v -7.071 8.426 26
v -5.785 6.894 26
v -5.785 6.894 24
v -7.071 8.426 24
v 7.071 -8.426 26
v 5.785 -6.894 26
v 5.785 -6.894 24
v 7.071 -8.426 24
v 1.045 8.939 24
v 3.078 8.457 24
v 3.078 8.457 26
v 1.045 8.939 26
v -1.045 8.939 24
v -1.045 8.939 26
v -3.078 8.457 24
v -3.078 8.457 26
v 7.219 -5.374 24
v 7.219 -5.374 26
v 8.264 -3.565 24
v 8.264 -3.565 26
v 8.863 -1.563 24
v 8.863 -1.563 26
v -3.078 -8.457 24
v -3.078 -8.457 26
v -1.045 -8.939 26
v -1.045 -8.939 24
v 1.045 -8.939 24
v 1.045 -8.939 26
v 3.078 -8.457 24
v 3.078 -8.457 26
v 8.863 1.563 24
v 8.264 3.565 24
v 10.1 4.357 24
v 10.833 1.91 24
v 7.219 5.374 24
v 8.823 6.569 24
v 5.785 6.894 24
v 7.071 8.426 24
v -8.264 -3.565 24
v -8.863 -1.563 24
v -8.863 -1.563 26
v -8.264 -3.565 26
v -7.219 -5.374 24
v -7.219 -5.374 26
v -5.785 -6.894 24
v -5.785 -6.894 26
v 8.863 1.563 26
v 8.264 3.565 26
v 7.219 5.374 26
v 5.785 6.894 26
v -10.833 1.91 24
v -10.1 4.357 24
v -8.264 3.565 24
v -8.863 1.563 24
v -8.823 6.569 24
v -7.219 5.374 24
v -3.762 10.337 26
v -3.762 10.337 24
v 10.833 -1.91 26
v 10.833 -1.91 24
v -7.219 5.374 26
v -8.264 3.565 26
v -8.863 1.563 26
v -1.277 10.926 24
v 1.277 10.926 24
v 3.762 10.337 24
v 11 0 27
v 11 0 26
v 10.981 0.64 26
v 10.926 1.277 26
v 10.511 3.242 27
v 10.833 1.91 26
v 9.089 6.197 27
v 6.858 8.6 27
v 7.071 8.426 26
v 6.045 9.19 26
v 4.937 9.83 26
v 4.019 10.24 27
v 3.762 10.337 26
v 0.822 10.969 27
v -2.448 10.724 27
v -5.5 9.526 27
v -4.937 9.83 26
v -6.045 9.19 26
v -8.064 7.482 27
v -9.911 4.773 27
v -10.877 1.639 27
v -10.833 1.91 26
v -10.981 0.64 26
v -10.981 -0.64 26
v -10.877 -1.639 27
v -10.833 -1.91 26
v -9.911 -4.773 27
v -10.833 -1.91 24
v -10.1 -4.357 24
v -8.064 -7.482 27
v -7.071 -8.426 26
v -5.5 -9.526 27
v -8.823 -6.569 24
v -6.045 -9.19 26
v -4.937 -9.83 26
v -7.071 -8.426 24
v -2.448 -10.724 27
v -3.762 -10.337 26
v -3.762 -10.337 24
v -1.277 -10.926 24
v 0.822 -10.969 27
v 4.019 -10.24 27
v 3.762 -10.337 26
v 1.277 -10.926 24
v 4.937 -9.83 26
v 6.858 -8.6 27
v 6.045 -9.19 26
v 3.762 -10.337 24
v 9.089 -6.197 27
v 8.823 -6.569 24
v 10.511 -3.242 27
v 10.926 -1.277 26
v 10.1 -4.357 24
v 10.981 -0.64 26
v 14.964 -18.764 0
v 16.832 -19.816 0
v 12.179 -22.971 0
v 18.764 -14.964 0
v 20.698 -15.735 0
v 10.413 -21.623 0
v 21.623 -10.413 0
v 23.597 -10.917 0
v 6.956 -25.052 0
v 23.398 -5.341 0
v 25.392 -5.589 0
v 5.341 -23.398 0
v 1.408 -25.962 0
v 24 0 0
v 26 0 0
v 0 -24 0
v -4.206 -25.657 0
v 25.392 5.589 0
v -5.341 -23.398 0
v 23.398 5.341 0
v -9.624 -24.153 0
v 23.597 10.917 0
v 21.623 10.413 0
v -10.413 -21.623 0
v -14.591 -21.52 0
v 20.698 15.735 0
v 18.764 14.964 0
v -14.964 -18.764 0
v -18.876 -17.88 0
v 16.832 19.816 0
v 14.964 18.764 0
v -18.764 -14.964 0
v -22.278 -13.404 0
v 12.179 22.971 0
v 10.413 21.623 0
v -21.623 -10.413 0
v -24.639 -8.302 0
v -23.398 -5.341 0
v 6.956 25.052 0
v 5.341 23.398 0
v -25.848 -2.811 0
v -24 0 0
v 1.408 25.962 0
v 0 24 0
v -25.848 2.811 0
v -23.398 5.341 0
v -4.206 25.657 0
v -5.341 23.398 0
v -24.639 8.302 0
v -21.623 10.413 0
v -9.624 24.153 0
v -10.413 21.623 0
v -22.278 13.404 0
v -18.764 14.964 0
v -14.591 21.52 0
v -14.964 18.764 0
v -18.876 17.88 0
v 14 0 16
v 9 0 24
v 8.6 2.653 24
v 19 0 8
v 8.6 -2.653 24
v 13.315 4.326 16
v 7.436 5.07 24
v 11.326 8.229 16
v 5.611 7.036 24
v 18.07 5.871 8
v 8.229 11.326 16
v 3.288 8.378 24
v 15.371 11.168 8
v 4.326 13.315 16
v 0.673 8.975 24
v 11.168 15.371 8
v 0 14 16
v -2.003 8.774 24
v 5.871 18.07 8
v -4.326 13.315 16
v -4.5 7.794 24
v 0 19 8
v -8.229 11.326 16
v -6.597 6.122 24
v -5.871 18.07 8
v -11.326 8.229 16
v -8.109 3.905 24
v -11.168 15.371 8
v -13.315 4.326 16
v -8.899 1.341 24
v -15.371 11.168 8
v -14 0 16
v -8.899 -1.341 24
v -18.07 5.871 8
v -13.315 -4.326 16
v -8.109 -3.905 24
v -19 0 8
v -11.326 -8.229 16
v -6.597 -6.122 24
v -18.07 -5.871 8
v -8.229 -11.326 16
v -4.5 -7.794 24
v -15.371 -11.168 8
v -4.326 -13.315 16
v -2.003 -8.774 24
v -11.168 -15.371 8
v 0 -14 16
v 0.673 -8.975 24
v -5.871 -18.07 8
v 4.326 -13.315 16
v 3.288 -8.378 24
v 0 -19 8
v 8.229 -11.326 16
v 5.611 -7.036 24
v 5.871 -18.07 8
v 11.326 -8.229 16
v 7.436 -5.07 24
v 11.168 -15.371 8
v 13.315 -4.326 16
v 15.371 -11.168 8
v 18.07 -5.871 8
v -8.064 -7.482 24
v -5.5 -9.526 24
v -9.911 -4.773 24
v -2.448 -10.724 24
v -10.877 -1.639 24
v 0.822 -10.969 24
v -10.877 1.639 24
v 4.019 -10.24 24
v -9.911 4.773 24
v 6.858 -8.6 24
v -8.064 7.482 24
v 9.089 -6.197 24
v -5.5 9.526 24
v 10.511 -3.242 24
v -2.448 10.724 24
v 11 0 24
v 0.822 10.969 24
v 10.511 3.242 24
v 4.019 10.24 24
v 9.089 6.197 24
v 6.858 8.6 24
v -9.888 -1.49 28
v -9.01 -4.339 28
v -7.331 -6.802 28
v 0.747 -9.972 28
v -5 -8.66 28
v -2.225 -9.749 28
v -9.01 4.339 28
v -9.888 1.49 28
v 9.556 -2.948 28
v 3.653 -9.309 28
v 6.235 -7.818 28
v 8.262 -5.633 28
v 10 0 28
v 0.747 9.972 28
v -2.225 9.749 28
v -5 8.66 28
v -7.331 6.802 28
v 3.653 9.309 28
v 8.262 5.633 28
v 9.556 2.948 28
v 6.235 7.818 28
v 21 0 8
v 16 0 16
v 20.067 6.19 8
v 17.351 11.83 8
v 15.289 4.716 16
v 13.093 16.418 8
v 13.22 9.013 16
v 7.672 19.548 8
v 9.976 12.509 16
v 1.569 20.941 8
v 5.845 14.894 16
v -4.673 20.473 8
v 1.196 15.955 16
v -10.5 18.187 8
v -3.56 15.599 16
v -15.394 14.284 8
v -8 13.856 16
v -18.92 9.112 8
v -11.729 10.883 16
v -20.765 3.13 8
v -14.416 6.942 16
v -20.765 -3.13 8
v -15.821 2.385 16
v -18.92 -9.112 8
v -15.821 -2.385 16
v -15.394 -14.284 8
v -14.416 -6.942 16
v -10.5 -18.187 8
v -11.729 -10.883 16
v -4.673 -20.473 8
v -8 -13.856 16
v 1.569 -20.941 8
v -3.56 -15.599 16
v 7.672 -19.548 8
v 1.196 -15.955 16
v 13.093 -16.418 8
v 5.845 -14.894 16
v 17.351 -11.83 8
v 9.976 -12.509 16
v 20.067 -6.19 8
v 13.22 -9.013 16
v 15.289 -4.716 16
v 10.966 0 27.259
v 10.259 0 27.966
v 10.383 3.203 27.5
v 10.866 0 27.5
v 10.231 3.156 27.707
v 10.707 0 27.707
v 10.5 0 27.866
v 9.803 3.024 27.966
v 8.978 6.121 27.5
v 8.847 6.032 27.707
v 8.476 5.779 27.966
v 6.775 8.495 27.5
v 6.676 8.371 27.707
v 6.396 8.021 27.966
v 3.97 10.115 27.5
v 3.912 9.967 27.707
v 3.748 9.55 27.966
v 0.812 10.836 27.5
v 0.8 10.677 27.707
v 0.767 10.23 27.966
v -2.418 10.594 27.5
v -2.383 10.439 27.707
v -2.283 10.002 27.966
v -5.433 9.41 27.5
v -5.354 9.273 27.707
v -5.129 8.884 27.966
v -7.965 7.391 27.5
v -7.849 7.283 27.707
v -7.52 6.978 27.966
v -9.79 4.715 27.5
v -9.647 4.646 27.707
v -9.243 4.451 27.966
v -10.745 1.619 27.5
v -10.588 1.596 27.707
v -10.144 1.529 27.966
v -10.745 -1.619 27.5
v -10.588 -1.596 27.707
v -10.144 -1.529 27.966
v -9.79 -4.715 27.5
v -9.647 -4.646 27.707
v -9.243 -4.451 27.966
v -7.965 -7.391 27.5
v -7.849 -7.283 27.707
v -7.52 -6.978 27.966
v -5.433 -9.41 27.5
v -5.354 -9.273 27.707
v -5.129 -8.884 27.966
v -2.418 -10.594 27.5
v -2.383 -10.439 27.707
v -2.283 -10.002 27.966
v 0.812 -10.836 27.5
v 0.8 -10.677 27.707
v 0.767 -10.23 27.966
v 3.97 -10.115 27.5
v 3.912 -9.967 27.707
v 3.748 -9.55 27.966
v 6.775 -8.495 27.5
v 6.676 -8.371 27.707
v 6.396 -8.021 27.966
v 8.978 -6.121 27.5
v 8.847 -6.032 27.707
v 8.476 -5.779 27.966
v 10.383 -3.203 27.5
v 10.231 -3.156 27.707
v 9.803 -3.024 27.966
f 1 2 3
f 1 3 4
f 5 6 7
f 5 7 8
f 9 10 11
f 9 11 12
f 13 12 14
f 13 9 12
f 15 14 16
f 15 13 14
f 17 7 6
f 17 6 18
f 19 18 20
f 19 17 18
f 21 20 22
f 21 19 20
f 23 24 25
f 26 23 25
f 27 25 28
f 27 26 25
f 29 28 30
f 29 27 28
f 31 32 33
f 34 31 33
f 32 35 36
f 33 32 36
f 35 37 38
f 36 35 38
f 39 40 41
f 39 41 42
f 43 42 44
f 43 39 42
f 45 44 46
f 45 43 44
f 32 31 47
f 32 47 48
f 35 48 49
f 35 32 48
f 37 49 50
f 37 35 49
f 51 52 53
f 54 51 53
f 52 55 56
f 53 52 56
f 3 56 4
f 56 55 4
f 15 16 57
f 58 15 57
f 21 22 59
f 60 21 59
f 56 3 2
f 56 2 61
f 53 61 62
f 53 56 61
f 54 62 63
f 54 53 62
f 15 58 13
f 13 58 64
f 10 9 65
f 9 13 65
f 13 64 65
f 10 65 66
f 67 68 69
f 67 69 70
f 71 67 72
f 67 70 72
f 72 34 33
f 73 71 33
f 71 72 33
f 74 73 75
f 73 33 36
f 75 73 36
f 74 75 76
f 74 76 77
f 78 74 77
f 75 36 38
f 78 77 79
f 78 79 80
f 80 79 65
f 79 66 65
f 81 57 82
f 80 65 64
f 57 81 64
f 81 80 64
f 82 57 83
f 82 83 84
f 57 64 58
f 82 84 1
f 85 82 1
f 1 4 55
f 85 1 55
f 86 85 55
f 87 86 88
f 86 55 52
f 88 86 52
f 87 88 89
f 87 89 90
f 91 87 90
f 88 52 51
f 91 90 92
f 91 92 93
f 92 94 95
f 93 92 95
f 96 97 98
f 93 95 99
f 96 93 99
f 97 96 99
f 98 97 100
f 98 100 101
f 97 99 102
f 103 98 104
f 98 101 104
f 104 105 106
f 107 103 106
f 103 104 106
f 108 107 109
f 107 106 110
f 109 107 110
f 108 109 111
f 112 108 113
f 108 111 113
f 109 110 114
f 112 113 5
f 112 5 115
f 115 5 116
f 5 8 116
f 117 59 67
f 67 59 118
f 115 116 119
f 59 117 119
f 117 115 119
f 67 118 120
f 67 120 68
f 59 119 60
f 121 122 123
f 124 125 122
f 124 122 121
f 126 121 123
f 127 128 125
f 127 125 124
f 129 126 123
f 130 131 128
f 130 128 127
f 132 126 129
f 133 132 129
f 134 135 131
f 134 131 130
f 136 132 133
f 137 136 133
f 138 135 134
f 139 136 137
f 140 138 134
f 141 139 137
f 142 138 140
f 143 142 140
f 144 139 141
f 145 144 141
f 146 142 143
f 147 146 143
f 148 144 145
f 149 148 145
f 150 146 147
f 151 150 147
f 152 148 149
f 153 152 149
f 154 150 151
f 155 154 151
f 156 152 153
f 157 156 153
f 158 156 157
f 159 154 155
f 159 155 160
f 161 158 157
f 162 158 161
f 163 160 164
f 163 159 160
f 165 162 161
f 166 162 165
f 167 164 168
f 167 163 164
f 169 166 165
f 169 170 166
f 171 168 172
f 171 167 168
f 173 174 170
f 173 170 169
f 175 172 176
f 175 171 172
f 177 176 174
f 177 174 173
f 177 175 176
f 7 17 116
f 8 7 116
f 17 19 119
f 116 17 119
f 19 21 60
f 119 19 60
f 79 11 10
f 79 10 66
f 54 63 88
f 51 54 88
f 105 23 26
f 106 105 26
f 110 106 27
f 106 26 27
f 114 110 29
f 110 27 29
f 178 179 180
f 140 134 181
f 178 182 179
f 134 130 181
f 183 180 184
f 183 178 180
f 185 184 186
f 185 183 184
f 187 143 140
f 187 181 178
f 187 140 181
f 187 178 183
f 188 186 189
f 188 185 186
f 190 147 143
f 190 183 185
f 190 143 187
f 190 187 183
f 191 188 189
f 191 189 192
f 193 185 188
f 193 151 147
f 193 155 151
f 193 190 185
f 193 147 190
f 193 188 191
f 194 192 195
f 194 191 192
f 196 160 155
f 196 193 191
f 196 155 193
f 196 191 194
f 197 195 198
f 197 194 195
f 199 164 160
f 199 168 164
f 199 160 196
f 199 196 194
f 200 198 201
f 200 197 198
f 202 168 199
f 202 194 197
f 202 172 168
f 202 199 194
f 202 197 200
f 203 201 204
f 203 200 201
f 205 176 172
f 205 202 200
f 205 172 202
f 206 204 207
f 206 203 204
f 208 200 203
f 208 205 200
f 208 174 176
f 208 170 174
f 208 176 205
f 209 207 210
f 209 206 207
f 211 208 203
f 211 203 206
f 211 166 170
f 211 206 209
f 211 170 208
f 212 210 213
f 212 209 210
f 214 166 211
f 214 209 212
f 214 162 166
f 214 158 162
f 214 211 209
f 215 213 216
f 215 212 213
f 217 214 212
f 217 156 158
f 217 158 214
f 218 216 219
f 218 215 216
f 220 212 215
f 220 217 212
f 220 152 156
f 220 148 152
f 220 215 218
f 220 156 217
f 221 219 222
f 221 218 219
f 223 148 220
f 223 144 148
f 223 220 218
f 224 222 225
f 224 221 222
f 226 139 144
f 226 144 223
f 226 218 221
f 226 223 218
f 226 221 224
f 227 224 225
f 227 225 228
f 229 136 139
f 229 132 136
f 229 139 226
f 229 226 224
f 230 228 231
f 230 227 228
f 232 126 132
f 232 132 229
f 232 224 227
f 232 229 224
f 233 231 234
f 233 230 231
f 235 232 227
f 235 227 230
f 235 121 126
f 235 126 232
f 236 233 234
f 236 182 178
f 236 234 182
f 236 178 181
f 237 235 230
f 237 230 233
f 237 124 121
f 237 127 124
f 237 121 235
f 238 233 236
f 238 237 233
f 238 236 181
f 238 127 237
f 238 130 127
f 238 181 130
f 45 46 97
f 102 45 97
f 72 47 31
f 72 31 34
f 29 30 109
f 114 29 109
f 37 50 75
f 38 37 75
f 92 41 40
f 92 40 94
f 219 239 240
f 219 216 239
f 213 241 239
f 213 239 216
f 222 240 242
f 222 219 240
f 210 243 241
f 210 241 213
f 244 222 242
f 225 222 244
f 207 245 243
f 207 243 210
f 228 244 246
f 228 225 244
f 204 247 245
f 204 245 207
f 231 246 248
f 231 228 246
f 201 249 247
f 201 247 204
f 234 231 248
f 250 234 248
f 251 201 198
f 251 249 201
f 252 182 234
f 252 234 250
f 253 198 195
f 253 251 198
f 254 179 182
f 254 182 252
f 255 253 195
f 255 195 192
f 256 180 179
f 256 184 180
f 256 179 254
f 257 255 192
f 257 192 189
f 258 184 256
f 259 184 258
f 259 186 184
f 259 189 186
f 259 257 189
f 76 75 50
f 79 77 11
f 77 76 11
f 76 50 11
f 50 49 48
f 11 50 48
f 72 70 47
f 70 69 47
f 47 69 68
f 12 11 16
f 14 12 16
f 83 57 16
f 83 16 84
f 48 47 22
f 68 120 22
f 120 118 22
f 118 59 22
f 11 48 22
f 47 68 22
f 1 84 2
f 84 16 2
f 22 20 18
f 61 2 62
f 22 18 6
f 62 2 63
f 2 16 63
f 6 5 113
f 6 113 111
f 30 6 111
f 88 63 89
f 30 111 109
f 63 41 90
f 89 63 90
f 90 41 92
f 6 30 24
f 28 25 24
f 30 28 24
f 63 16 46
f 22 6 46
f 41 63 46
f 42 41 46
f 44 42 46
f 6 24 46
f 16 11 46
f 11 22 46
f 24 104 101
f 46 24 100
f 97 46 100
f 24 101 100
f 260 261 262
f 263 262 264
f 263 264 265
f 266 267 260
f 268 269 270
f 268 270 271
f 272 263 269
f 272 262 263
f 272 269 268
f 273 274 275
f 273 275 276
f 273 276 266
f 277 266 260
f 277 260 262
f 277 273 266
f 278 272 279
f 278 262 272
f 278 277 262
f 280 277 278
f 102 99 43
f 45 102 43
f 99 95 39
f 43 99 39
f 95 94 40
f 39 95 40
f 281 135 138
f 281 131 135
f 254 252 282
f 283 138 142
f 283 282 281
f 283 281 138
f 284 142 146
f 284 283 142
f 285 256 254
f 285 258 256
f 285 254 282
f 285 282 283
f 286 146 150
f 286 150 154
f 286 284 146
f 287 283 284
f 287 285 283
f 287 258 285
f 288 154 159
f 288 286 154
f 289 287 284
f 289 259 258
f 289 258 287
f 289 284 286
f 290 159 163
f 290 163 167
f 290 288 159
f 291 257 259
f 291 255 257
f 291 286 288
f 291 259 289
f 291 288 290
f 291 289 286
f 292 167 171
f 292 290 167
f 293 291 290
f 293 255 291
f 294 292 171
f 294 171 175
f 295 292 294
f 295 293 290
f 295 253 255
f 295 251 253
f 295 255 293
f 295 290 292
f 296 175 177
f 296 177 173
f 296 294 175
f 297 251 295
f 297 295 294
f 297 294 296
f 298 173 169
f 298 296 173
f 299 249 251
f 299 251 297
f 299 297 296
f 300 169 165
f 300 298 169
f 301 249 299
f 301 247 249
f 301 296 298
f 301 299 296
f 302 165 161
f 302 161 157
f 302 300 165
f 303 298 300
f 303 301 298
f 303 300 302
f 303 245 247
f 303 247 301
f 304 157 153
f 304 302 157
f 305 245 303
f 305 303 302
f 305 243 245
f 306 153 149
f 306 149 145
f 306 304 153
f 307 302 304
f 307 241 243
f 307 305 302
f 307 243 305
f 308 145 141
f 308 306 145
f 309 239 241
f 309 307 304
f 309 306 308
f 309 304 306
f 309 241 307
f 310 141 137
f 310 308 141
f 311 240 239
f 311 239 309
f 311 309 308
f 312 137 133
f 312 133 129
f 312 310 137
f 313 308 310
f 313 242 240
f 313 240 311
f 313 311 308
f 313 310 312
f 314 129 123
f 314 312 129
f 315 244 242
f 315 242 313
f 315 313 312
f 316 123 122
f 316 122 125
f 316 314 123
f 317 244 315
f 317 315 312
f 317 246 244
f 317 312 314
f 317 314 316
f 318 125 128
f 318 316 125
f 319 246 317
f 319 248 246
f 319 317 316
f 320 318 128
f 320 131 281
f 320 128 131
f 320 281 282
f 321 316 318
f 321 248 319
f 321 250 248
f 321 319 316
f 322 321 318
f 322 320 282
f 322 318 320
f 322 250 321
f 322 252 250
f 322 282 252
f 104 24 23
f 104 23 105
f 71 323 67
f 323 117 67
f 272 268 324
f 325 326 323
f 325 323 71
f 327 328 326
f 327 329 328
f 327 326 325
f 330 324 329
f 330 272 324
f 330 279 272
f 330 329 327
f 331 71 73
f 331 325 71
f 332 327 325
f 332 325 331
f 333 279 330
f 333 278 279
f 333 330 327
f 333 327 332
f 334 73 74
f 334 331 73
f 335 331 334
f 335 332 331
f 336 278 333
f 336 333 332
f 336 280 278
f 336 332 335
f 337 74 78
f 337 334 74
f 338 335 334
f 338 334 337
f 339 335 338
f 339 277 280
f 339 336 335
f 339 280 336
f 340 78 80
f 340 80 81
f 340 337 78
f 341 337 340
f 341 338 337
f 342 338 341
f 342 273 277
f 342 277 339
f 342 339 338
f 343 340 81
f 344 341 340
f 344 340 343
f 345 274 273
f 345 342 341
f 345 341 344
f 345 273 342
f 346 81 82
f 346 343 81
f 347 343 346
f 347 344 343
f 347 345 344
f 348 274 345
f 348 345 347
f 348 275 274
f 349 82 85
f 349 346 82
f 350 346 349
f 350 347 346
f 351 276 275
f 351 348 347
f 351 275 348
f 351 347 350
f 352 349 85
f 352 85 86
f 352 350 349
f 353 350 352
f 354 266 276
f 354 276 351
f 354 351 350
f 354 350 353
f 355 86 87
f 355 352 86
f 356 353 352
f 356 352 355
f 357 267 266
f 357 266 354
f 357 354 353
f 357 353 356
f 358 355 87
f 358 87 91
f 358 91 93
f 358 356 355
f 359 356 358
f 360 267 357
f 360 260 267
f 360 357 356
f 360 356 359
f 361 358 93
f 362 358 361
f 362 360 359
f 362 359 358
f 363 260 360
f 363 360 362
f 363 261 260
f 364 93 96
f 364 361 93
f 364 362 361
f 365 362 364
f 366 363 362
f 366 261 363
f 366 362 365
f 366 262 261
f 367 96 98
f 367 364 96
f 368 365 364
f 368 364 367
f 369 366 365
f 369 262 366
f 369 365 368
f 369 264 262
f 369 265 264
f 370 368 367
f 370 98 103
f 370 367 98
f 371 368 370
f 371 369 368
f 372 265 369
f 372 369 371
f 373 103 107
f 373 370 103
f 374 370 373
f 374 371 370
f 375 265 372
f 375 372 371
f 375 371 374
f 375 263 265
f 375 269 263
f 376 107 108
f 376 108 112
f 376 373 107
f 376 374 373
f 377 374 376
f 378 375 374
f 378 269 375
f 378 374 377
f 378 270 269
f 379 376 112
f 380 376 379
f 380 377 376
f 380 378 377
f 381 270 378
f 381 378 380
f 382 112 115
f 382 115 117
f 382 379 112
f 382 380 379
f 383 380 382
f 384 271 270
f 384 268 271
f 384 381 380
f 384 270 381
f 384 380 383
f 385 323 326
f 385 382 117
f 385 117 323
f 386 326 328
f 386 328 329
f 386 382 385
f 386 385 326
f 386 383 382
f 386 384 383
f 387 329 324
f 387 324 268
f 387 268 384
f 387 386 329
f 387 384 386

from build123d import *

# Parameters (mm, degrees)
F3_DEPTH        = 2
F5_R            = 11
F6_DEPTH        = 2
F4_W            = 2
F4_H            = 2
F7_ANGLE_BACK   = 10
F7_ANGLE        = 20
F7_COPIES_COUNT = 6
F8_R            = 1


# Not quite as in the source:
# - a pattern or mirror of a feature is missing from the dataset's text; its kind, count and spacing are read off the source's solid


with BuildPart() as f1:
    # F0 (on Front) → F1 (revolve)
    with BuildSketch(Plane.XZ):
        Polygon((11, 24), (9, 24), (24, 0), (26, 0), align=None)
    revolve(axis=Axis((0, 0, 12), (0, 0, 1)))


with BuildPart() as f3:
    # F3 (new): a face of the model
    f3_faces = [f1.part.faces().sort_by_distance(p)[0] for p in [
        (-10.6888730163, 0, 24),
    ]]
    extrude(f3_faces, amount=F3_DEPTH)

    # F5 (on face) → F6 (join)
    with BuildSketch(Plane.XY.offset(26)):
        Circle(F5_R)
    extrude(amount=F6_DEPTH)

    # F4 (on Front) → F7 (revolve, cut)
    with BuildSketch(Plane.XZ, mode=Mode.PRIVATE) as f7_sk:
        with Locations((10, 25)):
            Rectangle(F4_W, F4_H)
    f7 = revolve(f7_sk.sketch.rotate(Axis((0, 0, 28.8), (0, 0, -1)), -F7_ANGLE_BACK), axis=Axis((0, 0, 28.8), (0, 0, -1)), revolution_arc=F7_ANGLE, mode=Mode.SUBTRACT)

    # F7_copies: F7 ×6 about axis
    f7_copies_axis = Axis((0, 0, 0), (0, 0, 1))
    for i in range(1, F7_COPIES_COUNT):
        add(f7.rotate(f7_copies_axis, i * 360 / F7_COPIES_COUNT), mode=Mode.SUBTRACT)

    # F8
    f8_edges = [f3.edges().sort_by_distance(p)[0] for p in [
        (-11, 0, 28),
    ]]
    fillet(f8_edges, radius=F8_R)


solid = Compound([f1.part, f3.part])
